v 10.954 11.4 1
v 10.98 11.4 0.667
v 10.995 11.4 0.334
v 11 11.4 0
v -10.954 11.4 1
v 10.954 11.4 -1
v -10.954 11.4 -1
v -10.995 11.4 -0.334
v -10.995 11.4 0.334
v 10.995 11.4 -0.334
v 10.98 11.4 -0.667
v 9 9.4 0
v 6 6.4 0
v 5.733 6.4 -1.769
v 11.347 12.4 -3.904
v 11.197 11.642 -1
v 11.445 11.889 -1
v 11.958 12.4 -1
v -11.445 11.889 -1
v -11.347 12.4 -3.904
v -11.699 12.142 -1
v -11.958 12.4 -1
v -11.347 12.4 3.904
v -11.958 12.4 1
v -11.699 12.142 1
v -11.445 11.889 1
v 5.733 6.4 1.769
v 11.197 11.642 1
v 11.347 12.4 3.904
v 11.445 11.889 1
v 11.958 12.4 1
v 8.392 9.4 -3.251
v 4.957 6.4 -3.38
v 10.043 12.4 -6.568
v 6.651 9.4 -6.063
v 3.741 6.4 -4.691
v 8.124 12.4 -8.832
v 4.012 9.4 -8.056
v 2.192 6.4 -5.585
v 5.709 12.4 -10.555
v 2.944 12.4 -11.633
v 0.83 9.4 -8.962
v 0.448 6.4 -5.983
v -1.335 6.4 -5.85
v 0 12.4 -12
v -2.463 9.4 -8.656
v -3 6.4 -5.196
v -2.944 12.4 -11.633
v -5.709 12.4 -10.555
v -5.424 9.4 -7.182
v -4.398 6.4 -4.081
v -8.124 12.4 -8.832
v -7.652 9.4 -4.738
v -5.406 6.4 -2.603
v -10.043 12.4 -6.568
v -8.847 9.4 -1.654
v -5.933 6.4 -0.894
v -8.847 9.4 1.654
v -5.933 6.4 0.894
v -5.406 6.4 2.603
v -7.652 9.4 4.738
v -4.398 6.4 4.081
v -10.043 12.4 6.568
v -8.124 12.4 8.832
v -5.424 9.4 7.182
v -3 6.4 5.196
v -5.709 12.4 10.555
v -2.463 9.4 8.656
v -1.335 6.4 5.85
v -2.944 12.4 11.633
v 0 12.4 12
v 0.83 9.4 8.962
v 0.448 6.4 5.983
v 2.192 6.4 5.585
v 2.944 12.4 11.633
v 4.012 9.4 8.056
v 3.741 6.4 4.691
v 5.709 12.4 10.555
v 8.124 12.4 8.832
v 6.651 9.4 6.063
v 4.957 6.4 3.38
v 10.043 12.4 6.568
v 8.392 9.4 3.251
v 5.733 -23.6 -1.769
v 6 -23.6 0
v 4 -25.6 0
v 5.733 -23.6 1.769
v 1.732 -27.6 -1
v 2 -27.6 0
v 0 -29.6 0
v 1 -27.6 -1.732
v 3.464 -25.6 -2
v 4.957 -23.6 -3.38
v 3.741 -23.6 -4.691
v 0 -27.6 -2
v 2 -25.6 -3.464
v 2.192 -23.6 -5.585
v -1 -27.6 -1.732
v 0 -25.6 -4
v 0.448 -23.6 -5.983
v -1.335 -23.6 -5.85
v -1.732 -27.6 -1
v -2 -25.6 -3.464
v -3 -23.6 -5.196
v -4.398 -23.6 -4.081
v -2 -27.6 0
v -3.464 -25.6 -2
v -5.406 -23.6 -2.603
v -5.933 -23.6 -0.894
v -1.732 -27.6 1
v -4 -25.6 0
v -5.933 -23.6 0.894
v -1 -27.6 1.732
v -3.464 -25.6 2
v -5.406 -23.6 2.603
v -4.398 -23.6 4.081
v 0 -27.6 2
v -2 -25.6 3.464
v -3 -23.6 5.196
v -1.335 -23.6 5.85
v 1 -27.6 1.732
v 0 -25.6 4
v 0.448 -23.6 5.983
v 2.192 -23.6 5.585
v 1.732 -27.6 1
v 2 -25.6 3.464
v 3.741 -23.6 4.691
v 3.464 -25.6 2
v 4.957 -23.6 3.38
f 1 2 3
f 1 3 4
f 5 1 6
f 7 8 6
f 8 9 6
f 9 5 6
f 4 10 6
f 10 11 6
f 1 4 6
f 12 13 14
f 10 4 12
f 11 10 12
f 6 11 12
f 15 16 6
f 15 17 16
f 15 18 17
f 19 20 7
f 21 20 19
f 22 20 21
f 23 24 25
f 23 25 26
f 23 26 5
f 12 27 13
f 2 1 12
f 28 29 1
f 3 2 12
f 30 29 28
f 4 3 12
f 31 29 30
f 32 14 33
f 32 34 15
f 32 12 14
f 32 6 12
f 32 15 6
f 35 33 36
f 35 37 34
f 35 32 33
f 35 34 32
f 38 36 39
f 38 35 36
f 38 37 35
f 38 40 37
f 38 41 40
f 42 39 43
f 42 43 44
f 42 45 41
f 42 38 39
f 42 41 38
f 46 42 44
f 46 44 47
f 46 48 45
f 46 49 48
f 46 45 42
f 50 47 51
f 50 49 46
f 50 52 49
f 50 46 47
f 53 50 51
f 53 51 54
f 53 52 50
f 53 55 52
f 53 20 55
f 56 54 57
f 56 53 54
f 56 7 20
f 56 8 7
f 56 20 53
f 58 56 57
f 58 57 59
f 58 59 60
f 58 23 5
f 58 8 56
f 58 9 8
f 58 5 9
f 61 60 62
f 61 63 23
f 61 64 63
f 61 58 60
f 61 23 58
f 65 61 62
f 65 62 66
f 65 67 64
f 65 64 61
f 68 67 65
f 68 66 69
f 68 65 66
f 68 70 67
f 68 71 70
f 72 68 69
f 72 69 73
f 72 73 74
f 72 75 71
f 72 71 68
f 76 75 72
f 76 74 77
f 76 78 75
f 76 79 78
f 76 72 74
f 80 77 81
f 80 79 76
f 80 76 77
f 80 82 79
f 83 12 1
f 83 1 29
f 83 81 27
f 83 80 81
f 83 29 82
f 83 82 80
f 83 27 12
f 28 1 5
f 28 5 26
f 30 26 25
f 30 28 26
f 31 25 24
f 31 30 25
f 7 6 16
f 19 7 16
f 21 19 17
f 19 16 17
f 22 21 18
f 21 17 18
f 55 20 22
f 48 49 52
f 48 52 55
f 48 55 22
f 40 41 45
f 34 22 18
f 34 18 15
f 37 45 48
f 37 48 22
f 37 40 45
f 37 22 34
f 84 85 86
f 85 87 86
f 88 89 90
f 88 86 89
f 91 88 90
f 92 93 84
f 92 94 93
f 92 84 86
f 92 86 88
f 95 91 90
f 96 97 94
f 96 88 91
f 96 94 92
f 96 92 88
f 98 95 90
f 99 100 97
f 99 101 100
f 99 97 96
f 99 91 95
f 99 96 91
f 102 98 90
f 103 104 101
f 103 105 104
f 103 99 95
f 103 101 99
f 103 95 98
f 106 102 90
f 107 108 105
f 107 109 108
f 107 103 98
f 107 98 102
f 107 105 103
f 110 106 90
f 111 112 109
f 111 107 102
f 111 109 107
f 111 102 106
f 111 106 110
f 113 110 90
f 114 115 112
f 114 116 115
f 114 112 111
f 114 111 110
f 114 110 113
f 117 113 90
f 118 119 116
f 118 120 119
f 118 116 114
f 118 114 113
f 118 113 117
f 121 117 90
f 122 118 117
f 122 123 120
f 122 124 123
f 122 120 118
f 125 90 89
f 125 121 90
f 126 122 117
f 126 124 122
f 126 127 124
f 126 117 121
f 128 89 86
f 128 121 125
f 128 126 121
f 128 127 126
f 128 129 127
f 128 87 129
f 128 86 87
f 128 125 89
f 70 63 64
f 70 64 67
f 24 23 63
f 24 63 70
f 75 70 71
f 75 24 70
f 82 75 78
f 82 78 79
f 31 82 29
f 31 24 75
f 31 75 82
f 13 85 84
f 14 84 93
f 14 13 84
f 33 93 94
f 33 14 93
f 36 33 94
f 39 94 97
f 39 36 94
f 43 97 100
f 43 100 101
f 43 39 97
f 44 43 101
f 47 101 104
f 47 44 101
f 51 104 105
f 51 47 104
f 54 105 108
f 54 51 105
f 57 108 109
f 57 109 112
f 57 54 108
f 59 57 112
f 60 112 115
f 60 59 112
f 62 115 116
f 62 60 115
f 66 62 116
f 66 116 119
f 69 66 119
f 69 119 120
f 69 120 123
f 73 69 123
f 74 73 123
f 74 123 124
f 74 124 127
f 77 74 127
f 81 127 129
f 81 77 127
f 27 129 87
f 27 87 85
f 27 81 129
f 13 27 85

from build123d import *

# Parameters (mm, degrees)
SKETCH2_W          = 2
SKETCH2_H          = 2
CUT_EXTRUDE1_DEPTH = 50


with BuildPart() as part:
    # Sketch1 → Revolve2 (revolve)
    with BuildSketch(Plane.XY):
        Polygon((12, 12.4), (0, 12.4), (0, 6.48), (0, -29.6), (6, -23.6), (6, 6.4), align=None)
    revolve(axis=Axis((0, -39.28, 0), (0, 1, 0)))

    # Sketch2 → Cut-Extrude1 (cut, symmetric)
    with BuildSketch(Plane(origin=(0, 0, 0), x_dir=(0, 0, -1), z_dir=(1, 0, 0))):
        with Locations((0, 12.4)):
            Rectangle(SKETCH2_W, SKETCH2_H)
    extrude(amount=CUT_EXTRUDE1_DEPTH, both=True, mode=Mode.SUBTRACT)


solid = part.part
